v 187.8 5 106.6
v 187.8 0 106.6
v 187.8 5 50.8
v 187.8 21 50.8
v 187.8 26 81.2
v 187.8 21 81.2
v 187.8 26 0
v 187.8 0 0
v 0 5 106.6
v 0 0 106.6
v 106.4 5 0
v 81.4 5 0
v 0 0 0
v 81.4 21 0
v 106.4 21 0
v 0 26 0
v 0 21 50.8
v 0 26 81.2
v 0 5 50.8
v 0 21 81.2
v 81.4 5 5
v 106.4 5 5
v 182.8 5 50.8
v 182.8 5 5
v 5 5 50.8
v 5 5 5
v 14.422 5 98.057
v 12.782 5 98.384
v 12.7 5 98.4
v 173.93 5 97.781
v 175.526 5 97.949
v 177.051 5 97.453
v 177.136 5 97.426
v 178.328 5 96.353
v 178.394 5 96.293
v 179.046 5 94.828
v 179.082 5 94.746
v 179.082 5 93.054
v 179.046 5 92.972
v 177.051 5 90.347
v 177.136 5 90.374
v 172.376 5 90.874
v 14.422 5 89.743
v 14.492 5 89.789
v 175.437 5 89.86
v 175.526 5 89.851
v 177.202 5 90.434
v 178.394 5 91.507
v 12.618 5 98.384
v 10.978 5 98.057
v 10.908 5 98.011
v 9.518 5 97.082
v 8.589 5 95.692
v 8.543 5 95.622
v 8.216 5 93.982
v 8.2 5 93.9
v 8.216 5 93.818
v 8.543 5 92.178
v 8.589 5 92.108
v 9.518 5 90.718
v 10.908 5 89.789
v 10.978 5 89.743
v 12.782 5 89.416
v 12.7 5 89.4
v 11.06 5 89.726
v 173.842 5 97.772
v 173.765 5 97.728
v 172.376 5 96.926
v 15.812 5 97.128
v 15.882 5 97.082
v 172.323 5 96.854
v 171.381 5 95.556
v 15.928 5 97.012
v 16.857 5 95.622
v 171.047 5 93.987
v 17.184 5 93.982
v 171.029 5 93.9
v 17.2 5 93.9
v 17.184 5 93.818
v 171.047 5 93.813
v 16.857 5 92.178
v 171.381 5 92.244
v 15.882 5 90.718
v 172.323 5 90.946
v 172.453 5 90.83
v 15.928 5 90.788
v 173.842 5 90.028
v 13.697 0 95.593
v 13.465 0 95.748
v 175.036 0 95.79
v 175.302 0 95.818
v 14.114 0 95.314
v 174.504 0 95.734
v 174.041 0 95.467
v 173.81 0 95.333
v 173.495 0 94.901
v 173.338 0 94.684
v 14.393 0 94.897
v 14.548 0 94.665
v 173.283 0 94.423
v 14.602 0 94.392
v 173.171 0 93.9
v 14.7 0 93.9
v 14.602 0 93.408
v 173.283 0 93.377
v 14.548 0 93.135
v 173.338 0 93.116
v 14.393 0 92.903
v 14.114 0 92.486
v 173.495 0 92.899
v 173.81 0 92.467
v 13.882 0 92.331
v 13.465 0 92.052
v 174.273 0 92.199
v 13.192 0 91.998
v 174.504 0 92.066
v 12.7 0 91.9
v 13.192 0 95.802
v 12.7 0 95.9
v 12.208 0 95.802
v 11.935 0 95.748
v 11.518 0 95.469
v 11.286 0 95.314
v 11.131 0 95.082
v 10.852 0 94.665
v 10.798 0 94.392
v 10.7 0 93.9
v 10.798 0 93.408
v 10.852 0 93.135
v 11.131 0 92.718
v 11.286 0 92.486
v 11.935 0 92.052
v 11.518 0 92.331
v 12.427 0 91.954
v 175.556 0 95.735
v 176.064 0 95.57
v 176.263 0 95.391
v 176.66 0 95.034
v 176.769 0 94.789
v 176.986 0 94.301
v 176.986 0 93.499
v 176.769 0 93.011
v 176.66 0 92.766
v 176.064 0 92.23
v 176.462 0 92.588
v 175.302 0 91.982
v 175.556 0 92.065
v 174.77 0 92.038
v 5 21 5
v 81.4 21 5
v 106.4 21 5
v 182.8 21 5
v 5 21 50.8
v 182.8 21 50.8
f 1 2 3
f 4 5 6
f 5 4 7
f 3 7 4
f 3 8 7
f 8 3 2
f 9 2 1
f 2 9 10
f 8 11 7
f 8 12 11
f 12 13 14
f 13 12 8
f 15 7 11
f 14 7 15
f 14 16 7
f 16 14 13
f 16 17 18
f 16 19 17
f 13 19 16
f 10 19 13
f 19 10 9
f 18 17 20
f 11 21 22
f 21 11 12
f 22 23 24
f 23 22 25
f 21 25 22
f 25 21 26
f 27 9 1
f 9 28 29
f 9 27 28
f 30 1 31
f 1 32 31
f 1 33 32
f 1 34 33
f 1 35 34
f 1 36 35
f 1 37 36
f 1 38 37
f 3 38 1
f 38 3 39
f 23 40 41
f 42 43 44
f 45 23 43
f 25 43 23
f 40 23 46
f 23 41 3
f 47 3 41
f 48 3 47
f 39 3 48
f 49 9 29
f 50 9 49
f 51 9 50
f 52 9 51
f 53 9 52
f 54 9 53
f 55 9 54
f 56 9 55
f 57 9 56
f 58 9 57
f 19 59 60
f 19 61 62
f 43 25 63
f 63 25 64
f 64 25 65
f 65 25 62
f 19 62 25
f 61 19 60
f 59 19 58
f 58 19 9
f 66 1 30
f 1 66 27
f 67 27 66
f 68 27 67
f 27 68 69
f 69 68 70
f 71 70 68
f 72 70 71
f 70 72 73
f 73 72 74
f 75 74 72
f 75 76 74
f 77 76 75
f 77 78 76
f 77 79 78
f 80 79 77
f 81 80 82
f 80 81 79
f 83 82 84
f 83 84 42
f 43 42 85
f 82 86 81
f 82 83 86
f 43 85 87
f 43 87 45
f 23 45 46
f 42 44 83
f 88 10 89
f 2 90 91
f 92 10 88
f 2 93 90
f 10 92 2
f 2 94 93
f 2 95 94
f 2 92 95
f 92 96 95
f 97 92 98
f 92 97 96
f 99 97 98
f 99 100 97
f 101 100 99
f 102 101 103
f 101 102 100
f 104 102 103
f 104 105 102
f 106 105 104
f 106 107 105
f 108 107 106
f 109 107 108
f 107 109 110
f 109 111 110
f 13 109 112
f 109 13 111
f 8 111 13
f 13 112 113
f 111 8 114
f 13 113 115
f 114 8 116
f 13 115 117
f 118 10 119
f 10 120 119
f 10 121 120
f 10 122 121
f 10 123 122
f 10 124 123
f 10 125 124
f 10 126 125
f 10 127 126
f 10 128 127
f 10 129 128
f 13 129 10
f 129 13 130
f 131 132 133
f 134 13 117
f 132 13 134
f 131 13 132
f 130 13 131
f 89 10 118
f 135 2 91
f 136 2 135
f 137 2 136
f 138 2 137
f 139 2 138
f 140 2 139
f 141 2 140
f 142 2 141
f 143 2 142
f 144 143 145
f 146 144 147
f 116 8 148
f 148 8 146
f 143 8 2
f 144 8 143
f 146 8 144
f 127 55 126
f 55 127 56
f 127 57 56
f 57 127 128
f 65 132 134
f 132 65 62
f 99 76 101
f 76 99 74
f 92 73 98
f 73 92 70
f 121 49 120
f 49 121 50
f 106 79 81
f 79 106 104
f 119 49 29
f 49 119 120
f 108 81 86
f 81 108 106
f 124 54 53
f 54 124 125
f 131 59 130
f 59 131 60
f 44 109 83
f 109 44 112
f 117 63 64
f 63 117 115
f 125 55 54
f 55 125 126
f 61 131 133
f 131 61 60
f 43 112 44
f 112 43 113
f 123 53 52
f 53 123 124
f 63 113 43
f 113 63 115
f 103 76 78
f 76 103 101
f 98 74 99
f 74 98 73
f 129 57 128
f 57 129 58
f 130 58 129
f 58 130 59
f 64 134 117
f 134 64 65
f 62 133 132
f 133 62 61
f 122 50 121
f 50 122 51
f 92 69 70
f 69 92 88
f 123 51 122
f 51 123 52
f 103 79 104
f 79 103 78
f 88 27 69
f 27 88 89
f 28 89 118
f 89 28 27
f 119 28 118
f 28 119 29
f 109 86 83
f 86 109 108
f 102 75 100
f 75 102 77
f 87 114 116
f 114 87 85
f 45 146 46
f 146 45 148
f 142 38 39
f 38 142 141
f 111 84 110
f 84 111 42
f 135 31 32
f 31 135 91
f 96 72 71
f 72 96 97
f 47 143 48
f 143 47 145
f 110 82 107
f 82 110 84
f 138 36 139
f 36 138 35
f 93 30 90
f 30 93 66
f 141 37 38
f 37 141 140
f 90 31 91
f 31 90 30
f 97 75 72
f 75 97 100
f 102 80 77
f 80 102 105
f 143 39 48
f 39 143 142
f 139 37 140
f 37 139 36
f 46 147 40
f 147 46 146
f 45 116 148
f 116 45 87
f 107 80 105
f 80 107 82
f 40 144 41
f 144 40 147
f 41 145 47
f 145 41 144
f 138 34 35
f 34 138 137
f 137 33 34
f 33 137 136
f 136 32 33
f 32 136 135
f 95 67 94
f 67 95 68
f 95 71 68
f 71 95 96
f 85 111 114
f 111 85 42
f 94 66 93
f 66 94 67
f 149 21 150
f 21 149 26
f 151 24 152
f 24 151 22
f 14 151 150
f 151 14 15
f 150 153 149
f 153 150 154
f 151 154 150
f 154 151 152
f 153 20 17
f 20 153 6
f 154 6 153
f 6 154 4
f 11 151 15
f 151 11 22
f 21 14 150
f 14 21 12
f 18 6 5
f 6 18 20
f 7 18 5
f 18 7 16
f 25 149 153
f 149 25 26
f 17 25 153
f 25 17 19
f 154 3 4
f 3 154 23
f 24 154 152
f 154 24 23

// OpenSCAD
/*
Design:
    Nintendo Switch wall mount

Use:
    Wall mount for Nintendo Switch
*/

// Thickness
th = 5;
// Width
w = 177.8 + 2*th;

// Back plate
difference() {
    cube([w, th, 101.6+th], center=false);
    // Screw hole
    translate([12.7,-1,88.9+th]) {
        rotate([90,0,180]) {
            cylinder(h=th+2, d1=3, d2=10, center=false);
        }
    }
    translate([w-12.7,-1,88.9+th]) {
        rotate([90,0,180]) {
            cylinder(h=th+2, d1=3, d2=9, center=false);
        }
    }
}

// Bottom plate
difference() {
    cube([w, 16+th, th], center=false);
    translate([w/2-2.5*th,th,-1]) {
        cube([th*5,16,th+2], center=false);
    }
}

// Front plate
translate([0, 16+th, 0]) {
    cube([w, th, 76.2+th], center=false);
}

// Side plates
cube([th, 2*th+16, 50.8], center=false);
translate([w-th,0,0]) {
    cube([th, 2*th+16, 50.8], center=false);
}
